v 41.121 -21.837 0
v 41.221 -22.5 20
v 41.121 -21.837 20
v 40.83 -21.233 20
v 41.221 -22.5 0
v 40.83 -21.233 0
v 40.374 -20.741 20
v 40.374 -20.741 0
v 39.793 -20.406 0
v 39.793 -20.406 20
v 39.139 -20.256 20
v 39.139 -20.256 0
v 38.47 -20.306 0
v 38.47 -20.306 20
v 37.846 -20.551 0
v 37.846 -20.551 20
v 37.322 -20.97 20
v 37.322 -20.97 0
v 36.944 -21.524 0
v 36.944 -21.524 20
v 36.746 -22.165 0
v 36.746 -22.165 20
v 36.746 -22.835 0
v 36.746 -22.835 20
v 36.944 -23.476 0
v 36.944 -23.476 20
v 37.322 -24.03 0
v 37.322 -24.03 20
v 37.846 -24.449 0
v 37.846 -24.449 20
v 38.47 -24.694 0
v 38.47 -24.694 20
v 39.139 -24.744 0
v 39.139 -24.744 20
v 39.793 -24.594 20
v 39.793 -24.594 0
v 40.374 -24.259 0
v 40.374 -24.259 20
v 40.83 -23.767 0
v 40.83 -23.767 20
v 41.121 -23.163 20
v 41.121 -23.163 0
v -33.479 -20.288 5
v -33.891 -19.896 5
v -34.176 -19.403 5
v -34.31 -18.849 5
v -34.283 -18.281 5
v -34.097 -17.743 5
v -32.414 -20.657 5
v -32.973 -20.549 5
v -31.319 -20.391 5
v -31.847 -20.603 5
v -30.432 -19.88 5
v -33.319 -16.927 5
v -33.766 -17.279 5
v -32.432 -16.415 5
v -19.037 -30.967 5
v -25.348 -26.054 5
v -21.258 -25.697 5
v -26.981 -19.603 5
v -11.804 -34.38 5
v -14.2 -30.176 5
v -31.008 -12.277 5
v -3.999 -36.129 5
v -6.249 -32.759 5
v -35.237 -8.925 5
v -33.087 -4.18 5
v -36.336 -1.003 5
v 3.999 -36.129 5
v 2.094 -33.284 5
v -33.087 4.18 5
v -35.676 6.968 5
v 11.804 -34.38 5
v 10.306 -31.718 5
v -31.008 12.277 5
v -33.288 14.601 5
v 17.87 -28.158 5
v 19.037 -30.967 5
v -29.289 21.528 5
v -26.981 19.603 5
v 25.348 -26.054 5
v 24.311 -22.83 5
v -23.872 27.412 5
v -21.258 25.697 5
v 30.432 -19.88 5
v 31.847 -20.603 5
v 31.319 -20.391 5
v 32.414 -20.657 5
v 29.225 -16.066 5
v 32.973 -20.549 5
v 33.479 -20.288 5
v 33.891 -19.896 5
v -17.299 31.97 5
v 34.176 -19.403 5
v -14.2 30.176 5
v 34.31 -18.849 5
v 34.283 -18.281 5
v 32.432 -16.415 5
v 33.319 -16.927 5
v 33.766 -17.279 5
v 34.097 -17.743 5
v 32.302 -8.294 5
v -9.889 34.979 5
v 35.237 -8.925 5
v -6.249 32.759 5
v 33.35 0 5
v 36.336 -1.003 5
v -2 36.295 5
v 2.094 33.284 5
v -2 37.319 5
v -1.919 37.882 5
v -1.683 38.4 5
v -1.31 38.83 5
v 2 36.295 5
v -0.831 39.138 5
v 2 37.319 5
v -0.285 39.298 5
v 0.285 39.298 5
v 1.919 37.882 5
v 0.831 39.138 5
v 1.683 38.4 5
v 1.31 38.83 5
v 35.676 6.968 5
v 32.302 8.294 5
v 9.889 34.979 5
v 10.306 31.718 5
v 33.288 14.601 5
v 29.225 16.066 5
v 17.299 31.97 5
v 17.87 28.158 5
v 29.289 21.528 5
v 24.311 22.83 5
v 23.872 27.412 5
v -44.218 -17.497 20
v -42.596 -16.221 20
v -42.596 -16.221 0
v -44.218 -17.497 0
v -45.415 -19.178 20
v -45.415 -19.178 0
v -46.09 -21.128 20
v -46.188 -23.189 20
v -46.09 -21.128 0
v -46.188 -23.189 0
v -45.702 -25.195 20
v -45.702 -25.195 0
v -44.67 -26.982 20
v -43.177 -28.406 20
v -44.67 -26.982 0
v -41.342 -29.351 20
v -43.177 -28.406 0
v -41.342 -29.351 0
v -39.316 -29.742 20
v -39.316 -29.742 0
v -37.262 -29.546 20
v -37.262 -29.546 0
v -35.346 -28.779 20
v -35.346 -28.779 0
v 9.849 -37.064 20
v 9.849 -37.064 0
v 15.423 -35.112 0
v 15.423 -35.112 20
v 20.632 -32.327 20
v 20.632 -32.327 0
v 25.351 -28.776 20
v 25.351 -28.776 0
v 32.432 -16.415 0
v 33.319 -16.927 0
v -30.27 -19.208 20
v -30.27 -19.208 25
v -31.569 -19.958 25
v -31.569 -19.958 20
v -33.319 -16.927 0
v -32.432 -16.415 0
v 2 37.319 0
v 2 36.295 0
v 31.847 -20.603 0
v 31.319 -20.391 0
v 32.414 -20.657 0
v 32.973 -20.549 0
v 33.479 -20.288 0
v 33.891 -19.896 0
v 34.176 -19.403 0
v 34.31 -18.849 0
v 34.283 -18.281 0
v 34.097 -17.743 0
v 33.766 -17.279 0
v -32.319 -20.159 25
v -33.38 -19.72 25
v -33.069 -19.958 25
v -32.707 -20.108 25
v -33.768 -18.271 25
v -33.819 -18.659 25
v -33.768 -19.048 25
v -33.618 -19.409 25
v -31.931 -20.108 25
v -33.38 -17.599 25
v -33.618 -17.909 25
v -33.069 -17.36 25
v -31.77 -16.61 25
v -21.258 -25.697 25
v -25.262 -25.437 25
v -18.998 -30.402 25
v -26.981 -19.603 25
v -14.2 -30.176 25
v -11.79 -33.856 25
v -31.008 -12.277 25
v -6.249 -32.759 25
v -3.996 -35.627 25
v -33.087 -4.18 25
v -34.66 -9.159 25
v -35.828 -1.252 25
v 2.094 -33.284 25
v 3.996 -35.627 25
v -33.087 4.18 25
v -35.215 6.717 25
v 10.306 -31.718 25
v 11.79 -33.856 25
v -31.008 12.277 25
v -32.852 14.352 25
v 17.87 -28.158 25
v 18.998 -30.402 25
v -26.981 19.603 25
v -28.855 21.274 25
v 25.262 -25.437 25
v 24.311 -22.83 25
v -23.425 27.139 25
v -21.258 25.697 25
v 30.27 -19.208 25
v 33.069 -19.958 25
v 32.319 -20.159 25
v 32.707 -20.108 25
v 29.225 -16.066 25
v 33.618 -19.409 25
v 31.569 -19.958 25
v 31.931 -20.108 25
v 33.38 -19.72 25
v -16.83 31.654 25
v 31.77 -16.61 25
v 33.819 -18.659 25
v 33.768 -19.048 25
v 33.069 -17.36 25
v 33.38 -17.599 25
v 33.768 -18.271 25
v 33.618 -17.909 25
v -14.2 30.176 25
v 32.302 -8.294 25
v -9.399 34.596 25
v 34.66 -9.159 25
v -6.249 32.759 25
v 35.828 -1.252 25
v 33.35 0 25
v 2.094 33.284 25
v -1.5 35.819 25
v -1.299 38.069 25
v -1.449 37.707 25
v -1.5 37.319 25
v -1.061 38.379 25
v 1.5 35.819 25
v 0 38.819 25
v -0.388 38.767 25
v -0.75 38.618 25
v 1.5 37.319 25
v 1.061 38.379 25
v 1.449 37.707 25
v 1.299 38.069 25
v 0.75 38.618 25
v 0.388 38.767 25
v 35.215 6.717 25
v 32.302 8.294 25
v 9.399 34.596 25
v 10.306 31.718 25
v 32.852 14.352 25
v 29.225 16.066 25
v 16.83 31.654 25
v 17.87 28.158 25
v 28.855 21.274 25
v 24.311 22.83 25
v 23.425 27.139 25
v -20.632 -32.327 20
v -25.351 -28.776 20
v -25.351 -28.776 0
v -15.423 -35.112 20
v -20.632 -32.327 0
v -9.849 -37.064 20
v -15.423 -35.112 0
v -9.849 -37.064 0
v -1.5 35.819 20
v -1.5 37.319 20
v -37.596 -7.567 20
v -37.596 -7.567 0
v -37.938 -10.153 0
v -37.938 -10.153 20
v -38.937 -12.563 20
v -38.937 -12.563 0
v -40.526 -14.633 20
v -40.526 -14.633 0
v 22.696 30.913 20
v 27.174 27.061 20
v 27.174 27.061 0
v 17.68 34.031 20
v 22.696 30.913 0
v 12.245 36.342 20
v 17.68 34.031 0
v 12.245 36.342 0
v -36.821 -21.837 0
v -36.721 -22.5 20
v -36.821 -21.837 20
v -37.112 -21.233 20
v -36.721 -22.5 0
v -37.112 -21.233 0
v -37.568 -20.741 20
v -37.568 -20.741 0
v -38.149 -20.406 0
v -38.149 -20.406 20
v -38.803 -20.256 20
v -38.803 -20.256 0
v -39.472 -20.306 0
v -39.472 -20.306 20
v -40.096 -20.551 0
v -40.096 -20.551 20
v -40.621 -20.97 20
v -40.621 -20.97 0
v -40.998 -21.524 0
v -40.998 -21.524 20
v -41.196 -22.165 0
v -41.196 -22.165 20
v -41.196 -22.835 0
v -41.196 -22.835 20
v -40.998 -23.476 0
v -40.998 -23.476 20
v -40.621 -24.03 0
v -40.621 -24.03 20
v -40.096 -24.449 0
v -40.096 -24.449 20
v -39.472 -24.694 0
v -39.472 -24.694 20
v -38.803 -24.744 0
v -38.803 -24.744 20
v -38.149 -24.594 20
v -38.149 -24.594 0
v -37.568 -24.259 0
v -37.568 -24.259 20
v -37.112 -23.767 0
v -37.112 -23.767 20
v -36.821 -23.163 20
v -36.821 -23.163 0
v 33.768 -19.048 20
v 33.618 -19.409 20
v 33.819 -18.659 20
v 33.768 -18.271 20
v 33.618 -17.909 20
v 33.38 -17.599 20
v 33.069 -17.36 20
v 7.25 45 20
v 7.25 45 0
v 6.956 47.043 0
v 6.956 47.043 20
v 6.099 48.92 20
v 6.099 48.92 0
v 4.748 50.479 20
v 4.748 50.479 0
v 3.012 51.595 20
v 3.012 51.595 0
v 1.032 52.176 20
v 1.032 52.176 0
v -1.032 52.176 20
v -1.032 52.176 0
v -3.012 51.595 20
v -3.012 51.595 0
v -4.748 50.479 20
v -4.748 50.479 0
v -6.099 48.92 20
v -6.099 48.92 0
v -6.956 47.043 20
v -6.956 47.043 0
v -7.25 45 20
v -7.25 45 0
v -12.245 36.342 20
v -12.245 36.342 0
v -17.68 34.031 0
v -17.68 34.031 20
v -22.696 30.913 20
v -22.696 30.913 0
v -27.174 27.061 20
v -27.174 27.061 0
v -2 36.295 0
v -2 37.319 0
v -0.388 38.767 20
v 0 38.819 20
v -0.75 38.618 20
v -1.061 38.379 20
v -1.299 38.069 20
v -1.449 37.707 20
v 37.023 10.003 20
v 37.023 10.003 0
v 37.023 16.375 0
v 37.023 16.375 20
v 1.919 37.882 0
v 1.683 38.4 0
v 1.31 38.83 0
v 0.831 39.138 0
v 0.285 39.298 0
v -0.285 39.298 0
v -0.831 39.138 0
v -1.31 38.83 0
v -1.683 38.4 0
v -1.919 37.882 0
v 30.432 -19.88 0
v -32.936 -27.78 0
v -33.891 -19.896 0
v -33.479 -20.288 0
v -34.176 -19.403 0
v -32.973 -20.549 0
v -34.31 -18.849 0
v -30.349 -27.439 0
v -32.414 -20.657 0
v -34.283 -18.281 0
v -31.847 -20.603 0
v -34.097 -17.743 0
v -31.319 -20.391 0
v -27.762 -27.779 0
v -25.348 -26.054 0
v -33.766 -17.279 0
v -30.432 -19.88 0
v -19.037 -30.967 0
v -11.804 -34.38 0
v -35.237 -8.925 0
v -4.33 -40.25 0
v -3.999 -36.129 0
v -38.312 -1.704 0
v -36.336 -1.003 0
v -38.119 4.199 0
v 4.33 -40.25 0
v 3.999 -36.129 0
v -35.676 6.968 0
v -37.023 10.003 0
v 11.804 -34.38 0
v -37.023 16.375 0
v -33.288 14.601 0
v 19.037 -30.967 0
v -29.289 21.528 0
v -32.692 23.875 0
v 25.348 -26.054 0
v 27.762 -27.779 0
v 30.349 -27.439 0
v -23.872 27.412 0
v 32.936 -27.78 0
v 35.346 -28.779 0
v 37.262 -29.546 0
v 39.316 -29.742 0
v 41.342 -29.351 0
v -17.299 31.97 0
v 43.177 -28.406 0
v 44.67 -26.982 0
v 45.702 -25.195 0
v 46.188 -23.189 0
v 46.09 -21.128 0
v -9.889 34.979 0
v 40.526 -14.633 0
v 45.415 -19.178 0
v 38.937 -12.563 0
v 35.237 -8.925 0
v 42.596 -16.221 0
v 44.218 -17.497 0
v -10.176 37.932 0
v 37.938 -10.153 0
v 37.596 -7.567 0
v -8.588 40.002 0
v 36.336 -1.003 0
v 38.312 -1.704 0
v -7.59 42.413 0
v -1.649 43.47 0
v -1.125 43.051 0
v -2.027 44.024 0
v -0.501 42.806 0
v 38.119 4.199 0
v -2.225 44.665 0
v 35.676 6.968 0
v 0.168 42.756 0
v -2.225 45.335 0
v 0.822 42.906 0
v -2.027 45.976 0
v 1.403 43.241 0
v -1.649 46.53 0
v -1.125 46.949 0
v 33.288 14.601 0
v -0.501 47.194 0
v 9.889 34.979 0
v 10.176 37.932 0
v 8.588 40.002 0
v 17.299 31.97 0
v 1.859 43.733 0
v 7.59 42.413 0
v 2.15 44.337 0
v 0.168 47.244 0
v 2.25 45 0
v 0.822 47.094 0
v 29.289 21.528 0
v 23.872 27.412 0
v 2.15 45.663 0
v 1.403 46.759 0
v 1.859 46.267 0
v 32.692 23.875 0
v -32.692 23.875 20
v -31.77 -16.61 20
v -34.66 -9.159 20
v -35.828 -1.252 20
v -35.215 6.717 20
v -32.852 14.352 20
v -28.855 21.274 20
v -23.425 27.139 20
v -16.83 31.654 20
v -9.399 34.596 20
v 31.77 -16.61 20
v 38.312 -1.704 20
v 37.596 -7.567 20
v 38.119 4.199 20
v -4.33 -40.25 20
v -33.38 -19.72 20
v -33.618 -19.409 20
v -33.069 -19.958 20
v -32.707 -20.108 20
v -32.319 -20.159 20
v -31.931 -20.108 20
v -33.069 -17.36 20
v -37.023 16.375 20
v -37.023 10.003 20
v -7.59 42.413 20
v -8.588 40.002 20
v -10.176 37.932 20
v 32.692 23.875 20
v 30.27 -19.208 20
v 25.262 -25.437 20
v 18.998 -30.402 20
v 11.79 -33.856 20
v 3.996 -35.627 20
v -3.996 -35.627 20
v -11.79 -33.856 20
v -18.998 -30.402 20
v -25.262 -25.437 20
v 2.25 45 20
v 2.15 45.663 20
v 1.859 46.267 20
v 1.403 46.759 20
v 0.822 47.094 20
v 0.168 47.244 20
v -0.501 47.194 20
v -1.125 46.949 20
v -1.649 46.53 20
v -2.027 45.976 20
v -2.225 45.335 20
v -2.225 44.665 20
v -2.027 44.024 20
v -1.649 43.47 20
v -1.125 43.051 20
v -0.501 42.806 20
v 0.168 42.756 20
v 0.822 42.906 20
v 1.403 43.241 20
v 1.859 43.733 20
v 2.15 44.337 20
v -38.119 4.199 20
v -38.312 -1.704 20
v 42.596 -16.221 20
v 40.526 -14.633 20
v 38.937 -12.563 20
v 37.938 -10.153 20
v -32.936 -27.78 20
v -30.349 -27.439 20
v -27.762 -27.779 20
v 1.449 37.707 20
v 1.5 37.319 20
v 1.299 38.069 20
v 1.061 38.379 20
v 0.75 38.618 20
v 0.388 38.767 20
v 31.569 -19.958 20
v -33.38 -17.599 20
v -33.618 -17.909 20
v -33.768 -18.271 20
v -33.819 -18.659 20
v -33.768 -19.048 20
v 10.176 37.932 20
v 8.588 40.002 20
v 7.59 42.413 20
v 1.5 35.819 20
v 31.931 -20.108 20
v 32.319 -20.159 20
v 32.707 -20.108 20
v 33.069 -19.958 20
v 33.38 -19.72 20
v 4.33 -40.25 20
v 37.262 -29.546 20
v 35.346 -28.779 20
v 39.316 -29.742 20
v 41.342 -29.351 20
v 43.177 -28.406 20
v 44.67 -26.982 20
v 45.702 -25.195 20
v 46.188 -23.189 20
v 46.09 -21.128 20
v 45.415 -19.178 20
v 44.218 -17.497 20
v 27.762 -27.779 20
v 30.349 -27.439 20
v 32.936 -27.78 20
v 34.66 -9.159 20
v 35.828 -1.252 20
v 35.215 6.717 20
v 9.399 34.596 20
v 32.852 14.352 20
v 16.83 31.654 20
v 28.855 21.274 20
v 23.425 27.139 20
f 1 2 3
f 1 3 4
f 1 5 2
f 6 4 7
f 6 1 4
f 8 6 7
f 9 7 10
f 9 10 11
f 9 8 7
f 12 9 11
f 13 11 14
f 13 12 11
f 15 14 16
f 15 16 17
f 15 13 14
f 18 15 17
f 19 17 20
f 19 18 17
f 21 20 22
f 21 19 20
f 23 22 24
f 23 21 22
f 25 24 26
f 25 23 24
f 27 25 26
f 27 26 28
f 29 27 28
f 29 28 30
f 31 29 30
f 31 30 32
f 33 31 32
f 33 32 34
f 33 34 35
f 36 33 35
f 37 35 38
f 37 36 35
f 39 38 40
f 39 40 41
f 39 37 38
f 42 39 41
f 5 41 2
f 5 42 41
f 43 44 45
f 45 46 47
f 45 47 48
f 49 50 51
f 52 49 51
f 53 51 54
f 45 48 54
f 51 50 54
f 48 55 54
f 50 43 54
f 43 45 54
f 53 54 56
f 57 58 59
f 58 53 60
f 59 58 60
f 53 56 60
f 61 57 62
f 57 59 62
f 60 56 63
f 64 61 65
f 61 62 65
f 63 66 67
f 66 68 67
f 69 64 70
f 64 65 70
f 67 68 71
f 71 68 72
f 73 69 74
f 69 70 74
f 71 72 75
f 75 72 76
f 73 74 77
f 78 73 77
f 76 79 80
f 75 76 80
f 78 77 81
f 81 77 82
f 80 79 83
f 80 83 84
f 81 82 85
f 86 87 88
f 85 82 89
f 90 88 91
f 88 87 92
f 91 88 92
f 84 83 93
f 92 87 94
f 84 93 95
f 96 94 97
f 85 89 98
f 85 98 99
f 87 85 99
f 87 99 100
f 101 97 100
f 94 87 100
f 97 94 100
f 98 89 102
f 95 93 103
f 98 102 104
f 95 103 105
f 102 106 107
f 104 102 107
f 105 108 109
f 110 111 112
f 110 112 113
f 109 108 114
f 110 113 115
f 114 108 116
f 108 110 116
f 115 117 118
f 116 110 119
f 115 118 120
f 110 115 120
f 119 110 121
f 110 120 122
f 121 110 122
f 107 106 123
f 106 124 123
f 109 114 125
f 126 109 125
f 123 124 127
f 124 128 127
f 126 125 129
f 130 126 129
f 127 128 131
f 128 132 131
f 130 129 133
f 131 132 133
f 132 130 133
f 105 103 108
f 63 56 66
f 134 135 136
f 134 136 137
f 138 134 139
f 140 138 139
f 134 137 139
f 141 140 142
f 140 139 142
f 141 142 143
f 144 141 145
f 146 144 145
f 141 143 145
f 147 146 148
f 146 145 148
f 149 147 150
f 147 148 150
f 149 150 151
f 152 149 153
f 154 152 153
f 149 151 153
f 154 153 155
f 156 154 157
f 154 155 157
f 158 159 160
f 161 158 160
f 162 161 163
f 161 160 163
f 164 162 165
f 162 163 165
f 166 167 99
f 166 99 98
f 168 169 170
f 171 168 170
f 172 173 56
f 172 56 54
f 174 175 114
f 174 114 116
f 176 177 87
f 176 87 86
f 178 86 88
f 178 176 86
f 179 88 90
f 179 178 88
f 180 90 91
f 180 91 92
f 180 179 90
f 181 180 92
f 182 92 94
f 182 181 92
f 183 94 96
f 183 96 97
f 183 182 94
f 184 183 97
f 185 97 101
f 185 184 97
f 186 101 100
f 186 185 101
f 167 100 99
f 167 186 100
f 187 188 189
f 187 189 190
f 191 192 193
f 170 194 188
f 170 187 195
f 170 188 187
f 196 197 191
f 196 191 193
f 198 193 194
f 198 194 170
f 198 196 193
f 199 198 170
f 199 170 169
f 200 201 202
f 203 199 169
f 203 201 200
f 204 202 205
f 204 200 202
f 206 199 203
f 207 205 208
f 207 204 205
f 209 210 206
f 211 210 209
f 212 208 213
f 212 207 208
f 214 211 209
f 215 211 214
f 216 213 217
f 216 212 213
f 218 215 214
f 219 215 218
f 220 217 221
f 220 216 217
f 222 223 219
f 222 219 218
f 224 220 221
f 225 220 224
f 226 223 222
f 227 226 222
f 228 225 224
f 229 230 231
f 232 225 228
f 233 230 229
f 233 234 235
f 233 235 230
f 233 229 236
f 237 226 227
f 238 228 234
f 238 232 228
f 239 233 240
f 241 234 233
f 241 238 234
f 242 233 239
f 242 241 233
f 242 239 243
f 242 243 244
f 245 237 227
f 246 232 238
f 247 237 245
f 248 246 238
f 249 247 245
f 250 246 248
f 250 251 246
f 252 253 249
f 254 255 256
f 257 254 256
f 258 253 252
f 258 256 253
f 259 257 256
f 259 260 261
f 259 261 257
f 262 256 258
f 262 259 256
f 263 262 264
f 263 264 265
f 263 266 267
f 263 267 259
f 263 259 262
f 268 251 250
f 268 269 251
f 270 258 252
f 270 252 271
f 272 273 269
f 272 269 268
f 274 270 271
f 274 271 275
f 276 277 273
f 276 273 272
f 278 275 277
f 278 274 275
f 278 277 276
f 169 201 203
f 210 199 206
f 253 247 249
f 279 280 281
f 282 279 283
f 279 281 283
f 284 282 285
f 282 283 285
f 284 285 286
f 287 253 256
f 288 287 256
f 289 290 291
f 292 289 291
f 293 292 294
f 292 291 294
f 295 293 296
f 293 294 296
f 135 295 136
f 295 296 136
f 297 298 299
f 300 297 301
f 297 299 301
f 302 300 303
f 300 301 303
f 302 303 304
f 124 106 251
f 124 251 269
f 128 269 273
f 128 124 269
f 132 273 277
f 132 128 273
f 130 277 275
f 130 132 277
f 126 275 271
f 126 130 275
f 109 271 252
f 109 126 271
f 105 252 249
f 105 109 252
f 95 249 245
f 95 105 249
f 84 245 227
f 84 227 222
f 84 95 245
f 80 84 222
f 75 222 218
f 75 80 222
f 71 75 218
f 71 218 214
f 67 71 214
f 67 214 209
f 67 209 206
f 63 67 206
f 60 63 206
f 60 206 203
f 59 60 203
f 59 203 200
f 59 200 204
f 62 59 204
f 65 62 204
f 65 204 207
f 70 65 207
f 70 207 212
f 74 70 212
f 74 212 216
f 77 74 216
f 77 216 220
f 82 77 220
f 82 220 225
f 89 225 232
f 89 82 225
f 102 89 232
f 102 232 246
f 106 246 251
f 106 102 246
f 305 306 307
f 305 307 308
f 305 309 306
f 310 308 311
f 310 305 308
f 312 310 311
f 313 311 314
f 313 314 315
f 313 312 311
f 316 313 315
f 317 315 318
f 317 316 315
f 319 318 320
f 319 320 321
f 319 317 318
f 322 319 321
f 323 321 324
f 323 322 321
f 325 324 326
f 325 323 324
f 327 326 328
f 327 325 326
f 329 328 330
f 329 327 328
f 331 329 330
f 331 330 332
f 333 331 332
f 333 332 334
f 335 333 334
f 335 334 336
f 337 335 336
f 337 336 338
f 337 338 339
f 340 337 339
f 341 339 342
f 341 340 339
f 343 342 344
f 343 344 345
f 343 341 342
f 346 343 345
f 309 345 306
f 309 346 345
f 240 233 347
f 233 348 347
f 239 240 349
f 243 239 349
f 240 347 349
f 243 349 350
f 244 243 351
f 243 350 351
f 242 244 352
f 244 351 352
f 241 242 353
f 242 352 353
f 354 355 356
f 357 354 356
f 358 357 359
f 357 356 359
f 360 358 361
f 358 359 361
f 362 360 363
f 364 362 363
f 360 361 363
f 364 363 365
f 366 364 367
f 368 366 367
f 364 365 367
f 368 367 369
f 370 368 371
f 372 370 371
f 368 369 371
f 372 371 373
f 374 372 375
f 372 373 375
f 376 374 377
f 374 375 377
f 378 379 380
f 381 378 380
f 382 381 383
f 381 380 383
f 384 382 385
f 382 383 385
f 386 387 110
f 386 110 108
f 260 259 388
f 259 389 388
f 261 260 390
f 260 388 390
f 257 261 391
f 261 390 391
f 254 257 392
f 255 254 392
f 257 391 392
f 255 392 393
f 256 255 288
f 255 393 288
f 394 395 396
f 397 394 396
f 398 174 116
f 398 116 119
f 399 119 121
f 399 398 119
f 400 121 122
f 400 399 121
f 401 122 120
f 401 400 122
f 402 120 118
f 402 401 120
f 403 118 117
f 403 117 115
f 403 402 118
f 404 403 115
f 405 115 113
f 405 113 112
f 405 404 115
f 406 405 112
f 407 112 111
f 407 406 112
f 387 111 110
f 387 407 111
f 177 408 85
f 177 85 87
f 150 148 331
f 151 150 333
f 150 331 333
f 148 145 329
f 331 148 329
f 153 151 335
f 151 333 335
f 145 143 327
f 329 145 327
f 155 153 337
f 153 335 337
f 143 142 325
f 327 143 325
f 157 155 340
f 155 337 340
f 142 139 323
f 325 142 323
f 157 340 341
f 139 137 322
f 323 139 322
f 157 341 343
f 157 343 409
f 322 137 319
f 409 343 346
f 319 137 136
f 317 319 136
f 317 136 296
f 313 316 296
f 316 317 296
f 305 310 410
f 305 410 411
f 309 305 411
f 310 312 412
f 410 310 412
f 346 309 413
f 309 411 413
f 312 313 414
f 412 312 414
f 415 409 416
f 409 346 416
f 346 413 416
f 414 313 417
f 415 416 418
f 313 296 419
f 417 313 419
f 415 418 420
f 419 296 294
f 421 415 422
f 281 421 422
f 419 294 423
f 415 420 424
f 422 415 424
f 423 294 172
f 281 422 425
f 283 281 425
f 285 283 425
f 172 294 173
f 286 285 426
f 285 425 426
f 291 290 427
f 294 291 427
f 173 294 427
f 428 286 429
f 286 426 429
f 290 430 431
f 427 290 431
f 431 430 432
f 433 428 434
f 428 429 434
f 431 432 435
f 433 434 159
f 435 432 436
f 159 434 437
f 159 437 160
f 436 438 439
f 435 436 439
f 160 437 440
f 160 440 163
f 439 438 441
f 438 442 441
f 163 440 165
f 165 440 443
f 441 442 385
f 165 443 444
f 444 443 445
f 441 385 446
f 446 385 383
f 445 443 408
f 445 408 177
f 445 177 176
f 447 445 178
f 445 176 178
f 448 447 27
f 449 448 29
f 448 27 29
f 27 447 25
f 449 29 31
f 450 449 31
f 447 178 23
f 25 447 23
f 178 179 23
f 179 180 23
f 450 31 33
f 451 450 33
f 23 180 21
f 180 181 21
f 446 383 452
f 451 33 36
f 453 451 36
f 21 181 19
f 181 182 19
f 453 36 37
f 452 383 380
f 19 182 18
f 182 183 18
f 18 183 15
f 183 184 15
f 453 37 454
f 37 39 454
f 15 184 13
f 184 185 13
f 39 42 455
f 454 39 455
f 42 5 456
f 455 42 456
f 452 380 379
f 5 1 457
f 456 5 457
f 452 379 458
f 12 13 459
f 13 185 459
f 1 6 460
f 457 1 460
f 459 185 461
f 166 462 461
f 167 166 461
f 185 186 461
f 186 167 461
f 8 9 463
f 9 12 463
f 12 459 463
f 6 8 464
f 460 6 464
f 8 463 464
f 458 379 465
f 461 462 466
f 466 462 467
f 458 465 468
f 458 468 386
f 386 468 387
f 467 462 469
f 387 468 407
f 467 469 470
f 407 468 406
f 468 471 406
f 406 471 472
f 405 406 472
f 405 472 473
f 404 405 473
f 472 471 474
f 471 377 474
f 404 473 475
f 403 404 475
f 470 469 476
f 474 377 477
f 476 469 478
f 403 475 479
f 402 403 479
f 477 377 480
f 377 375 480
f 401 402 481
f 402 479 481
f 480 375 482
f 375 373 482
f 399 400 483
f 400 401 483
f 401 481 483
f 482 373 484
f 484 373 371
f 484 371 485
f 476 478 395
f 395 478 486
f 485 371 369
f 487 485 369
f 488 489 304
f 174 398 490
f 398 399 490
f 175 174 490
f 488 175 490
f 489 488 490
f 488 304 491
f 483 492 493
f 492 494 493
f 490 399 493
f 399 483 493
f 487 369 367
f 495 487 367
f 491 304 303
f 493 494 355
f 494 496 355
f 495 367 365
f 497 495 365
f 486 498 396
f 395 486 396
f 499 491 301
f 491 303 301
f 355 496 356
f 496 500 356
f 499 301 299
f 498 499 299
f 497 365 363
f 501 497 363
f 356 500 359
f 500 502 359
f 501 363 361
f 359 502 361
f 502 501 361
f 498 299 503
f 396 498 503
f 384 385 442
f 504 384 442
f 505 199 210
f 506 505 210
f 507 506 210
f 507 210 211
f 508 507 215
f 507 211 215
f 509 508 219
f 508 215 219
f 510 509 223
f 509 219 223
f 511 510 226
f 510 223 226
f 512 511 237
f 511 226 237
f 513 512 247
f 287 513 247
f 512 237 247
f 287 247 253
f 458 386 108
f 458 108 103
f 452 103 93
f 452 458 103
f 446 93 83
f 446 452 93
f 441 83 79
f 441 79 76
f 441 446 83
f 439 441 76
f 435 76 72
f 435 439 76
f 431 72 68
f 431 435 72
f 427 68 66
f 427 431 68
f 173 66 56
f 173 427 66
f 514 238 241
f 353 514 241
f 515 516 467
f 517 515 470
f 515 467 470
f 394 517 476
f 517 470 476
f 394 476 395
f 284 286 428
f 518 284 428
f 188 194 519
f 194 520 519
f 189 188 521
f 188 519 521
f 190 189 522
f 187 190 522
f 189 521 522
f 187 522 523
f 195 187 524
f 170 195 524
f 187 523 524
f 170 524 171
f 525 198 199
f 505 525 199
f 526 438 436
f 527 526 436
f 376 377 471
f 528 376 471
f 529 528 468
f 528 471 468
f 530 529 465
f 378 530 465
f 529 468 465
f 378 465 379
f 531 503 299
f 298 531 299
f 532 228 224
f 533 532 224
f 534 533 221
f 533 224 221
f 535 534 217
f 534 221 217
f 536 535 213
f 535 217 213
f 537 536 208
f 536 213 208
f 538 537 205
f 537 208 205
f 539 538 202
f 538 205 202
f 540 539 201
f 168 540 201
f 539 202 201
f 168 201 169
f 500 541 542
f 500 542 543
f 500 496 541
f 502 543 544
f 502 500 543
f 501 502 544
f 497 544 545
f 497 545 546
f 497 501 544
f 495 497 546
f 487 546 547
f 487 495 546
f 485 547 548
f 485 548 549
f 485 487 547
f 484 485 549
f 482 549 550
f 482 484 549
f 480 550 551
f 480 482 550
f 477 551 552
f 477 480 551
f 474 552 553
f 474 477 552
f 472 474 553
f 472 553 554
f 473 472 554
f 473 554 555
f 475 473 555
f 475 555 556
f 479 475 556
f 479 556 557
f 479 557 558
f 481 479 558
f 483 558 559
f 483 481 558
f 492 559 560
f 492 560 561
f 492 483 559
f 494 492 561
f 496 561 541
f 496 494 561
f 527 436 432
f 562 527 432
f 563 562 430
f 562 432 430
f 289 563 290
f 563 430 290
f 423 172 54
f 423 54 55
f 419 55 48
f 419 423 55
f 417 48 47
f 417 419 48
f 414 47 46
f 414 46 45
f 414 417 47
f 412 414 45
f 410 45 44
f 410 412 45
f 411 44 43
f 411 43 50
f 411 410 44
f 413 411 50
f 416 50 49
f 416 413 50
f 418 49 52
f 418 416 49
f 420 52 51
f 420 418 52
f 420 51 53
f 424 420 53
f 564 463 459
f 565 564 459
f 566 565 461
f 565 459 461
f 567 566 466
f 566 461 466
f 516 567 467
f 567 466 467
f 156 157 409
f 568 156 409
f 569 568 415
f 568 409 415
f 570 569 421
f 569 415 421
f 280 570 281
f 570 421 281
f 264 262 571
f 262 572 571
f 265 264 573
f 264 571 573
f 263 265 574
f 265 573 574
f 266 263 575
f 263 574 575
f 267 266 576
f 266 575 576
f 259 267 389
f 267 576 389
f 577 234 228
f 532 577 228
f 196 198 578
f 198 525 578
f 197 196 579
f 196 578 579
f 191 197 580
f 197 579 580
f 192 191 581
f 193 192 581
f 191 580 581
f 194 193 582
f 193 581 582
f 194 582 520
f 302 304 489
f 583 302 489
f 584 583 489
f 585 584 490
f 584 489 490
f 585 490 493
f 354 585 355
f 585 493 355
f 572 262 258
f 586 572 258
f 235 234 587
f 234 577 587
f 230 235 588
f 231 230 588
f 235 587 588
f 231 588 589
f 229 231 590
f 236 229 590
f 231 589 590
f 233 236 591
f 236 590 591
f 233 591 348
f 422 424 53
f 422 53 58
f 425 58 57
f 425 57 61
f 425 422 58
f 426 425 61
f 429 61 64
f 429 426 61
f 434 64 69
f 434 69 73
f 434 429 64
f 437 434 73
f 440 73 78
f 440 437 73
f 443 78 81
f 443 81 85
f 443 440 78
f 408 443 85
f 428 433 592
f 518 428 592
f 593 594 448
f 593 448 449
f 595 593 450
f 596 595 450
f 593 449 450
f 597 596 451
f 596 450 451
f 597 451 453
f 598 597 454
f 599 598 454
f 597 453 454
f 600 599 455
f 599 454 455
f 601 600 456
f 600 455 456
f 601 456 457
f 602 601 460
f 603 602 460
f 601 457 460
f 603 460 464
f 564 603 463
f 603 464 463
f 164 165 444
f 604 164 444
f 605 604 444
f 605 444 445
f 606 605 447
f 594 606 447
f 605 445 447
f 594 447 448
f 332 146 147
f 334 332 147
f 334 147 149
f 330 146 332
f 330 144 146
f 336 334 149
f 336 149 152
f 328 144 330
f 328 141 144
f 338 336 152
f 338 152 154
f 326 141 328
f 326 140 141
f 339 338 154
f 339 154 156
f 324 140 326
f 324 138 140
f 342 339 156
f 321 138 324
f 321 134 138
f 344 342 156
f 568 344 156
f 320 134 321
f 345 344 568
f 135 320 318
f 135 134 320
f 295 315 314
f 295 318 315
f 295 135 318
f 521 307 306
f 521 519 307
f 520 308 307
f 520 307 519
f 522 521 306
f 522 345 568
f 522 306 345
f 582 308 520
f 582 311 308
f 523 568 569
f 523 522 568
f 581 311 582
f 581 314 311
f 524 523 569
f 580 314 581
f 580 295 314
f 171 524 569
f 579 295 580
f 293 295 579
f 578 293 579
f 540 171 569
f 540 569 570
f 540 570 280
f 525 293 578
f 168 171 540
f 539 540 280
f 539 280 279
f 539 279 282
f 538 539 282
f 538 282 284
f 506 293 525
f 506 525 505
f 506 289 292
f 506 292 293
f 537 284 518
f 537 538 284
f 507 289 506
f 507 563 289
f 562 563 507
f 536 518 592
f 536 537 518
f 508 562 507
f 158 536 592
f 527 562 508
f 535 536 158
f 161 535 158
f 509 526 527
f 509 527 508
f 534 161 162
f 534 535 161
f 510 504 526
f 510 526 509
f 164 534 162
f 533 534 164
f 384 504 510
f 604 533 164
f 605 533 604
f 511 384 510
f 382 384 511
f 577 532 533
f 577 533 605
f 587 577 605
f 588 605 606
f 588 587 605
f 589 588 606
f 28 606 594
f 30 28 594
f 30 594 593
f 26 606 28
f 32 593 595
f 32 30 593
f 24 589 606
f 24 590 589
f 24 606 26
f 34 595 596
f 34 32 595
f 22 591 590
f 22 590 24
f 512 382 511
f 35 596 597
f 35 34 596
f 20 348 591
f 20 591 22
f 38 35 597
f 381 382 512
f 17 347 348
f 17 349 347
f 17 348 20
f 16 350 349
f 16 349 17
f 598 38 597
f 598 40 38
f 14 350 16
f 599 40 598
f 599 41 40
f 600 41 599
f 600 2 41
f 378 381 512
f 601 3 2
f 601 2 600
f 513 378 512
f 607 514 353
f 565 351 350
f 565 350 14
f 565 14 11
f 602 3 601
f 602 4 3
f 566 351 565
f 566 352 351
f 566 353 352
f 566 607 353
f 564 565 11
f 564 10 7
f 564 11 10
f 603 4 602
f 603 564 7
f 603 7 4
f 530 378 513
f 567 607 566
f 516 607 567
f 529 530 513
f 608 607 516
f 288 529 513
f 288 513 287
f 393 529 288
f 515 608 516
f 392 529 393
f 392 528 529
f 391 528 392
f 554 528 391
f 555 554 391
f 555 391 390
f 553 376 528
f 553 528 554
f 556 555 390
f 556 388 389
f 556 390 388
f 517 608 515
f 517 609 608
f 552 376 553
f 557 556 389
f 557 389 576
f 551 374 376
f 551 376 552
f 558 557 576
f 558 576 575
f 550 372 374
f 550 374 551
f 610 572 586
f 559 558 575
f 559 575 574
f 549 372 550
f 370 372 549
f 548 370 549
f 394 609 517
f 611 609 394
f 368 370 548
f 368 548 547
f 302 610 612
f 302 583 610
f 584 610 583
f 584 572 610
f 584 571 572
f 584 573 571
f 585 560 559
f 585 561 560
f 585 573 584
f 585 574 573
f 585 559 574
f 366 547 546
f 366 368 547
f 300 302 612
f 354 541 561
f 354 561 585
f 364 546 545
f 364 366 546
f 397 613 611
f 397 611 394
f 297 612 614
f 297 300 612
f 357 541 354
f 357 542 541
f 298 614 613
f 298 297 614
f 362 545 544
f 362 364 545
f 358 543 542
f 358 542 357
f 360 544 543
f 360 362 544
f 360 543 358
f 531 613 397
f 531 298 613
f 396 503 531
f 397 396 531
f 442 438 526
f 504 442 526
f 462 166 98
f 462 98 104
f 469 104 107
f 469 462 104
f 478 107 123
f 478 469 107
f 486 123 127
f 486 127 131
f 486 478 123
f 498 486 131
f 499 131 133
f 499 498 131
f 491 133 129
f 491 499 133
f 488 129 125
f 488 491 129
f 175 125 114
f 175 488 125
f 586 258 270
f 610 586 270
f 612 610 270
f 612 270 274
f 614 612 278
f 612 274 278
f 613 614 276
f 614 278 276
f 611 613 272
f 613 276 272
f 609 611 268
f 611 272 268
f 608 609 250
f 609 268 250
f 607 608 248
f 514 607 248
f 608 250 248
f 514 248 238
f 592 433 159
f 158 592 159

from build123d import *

# Parameters (mm, degrees)
F0_R     = 2.25
F0_R_2   = 33.35
F1_DEPTH = 20
F2_R     = 33.35
F3_DEPTH = 25
F5_DEPTH = 5
F6_R     = 1.49999
F8_DEPTH = 5
F9_SIZE  = 5


# Not quite as in the source:
# - a fillet or chamfer is up to 0.001 mm smaller than in the source, because OpenCascade refuses the exact size


with BuildPart() as f1:
    # F0 (on Top) → F1 (new body)
    with BuildSketch(Plane.XY):
        with BuildLine():
            ThreePointArc((-35.3461431703, -28.7786841774), (-30.3488782685, -27.4389385893), (-25.3508812473, -28.775950375))
            ThreePointArc((-25.3508812473, -28.775950375), (0, -38.35), (25.3508812473, -28.775950375))
            ThreePointArc((25.3508812473, -28.775950375), (30.3488782685, -27.4389385893), (35.3461431703, -28.7786841774))
            ThreePointArc((35.3461431703, -28.7786841774), (45.2498273477, -26.125), (42.5961431703, -16.2213158226))
            ThreePointArc((42.5961431703, -16.2213158226), (38.9372570055, -12.5634302623), (37.5961446665, -7.566531981))
            ThreePointArc((37.5961446665, -7.566531981), (33.2120742351, 19.175), (12.2452634191, 36.342482356))
            ThreePointArc((12.2452634191, 36.342482356), (8.588378737, 40.0023688516), (7.25, 45))
            ThreePointArc((7.25, 45), (0, 52.25), (-7.25, 45))
            ThreePointArc((-7.25, 45), (-8.588378737, 40.0023688516), (-12.2452634191, 36.342482356))
            ThreePointArc((-12.2452634191, 36.342482356), (-33.2120742351, 19.175), (-37.5961446665, -7.566531981))
            ThreePointArc((-37.5961446665, -7.566531981), (-38.9372570055, -12.5634302623), (-42.5961431703, -16.2213158226))
            ThreePointArc((-42.5961431703, -16.2213158226), (-45.2498273477, -26.125), (-35.3461431703, -28.7786841774))
        make_face()
        with Locations((-38.9711431703, -22.5)):
            Circle(F0_R, mode=Mode.SUBTRACT)
        with Locations((38.9711431703, -22.5)):
            Circle(F0_R, mode=Mode.SUBTRACT)
        Circle(F0_R_2, mode=Mode.SUBTRACT)
        with Locations((0, 45)):
            Circle(F0_R, mode=Mode.SUBTRACT)
    extrude(amount=F1_DEPTH)

    # F2 (on Top) → F3 (join)
    with BuildSketch(Plane.XY):
        Polygon((37.0225860118, -21.375), (37.0225860118, 21.375), (0, 42.75), (-37.0225860118, 21.375), (-37.0225860118, -21.375), (0, -42.75), align=None)
        Circle(F2_R, mode=Mode.SUBTRACT)
    extrude(amount=F3_DEPTH)

    # F4 (on face) → F5 (cut)
    with BuildSketch(Plane.XY.offset(25)):
        Polygon((37.0225860118, -21.375), (37.0225860118, 21.375), (0, 42.75), (-37.0225860118, 21.375), (-37.0225860118, -21.375), (0, -42.75), align=None)
        with BuildLine():
            ThreePointArc((-31.7698222916, -16.6102646446), (-31.0470107257, 17.925), (-1.5, 35.8186055005))
            Line((-1.5, 35.8186055005), (-1.5, 38.8186055005))
            Line((-1.5, 38.8186055005), (0, 38.8186055005))
            Line((0, 38.8186055005), (1.5, 38.8186055005))
            Line((1.5, 38.8186055005), (1.5, 35.8186055005))
            ThreePointArc((1.5, 35.8186055005), (31.0470107257, 17.925), (31.7698222916, -16.6102646446))
            Line((31.7698222916, -16.6102646446), (34.3678985029, -18.1102646446))
            Line((34.3678985029, -18.1102646446), (33.6178985029, -19.4093027502))
            Line((33.6178985029, -19.4093027502), (32.8678985029, -20.7083408559))
            Line((32.8678985029, -20.7083408559), (30.2698222916, -19.2083408559))
            ThreePointArc((30.2698222916, -19.2083408559), (0, -35.85), (-30.2698222916, -19.2083408559))
            Line((-30.2698222916, -19.2083408559), (-32.8678985029, -20.7083408559))
            Line((-32.8678985029, -20.7083408559), (-33.6178985029, -19.4093027502))
            Line((-33.6178985029, -19.4093027502), (-34.3678985029, -18.1102646446))
            Line((-34.3678985029, -18.1102646446), (-31.7698222916, -16.6102646446))
        make_face(mode=Mode.SUBTRACT)
    extrude(amount=-F5_DEPTH, mode=Mode.SUBTRACT)

    # F6 (radius 1.5 in the source; OpenCascade refuses exactly that, so slightly less here)
    f6_edges = [f1.edges().sort_by_distance(p)[0] for p in [
        (-32.867899, -20.708341, 22.5),
        (-34.367899, -18.110265, 22.5),
        (32.867899, -20.708341, 22.5),
        (34.367899, -18.110265, 22.5),
        (1.5, 38.818606, 22.5),
        (-1.5, 38.818606, 22.5),
    ]]
    fillet(f6_edges, radius=F6_R)

    # F7 (on Top) → F8 (cut)
    with BuildSketch(Plane.XY):
        with BuildLine():
            Line((-31.3188603972, -20.3913535578), (-30.4323380454, -19.8795196393))
            ThreePointArc((-30.4323380454, -19.8795196393), (0, -36.35), (30.4323380454, -19.8795196393))
            Line((30.4323380454, -19.8795196393), (31.3188603972, -20.3913535578))
            ThreePointArc((31.3188603972, -20.3913535578), (34.0509112048, -19.6593027502), (33.3188603972, -16.9272519427))
            Line((33.3188603972, -16.9272519427), (32.4323380454, -16.4154180242))
            ThreePointArc((32.4323380454, -16.4154180242), (31.4800234276, 18.175), (2, 36.2949376635))
            Line((2, 36.2949376635), (2, 37.3186055005))
            ThreePointArc((2, 37.3186055005), (0, 39.3186055005), (-2, 37.3186055005))
            Line((-2, 37.3186055005), (-2, 36.2949376635))
            ThreePointArc((-2, 36.2949376635), (-31.4800234276, 18.175), (-32.4323380454, -16.4154180242))
            Line((-32.4323380454, -16.4154180242), (-33.3188603972, -16.9272519427))
            ThreePointArc((-33.3188603972, -16.9272519427), (-34.0509112048, -19.6593027502), (-31.3188603972, -20.3913535578))
        make_face()
    extrude(amount=F8_DEPTH, mode=Mode.SUBTRACT)

    # F9
    f9_edges = [f1.edges().sort_by_distance(p)[0] for p in [
        (0, -42.75, 10),
        (37.022586, 21.375, 10),
        (-37.022586, 21.375, 10),
    ]]
    chamfer(f9_edges, length=F9_SIZE)


solid = f1.part
